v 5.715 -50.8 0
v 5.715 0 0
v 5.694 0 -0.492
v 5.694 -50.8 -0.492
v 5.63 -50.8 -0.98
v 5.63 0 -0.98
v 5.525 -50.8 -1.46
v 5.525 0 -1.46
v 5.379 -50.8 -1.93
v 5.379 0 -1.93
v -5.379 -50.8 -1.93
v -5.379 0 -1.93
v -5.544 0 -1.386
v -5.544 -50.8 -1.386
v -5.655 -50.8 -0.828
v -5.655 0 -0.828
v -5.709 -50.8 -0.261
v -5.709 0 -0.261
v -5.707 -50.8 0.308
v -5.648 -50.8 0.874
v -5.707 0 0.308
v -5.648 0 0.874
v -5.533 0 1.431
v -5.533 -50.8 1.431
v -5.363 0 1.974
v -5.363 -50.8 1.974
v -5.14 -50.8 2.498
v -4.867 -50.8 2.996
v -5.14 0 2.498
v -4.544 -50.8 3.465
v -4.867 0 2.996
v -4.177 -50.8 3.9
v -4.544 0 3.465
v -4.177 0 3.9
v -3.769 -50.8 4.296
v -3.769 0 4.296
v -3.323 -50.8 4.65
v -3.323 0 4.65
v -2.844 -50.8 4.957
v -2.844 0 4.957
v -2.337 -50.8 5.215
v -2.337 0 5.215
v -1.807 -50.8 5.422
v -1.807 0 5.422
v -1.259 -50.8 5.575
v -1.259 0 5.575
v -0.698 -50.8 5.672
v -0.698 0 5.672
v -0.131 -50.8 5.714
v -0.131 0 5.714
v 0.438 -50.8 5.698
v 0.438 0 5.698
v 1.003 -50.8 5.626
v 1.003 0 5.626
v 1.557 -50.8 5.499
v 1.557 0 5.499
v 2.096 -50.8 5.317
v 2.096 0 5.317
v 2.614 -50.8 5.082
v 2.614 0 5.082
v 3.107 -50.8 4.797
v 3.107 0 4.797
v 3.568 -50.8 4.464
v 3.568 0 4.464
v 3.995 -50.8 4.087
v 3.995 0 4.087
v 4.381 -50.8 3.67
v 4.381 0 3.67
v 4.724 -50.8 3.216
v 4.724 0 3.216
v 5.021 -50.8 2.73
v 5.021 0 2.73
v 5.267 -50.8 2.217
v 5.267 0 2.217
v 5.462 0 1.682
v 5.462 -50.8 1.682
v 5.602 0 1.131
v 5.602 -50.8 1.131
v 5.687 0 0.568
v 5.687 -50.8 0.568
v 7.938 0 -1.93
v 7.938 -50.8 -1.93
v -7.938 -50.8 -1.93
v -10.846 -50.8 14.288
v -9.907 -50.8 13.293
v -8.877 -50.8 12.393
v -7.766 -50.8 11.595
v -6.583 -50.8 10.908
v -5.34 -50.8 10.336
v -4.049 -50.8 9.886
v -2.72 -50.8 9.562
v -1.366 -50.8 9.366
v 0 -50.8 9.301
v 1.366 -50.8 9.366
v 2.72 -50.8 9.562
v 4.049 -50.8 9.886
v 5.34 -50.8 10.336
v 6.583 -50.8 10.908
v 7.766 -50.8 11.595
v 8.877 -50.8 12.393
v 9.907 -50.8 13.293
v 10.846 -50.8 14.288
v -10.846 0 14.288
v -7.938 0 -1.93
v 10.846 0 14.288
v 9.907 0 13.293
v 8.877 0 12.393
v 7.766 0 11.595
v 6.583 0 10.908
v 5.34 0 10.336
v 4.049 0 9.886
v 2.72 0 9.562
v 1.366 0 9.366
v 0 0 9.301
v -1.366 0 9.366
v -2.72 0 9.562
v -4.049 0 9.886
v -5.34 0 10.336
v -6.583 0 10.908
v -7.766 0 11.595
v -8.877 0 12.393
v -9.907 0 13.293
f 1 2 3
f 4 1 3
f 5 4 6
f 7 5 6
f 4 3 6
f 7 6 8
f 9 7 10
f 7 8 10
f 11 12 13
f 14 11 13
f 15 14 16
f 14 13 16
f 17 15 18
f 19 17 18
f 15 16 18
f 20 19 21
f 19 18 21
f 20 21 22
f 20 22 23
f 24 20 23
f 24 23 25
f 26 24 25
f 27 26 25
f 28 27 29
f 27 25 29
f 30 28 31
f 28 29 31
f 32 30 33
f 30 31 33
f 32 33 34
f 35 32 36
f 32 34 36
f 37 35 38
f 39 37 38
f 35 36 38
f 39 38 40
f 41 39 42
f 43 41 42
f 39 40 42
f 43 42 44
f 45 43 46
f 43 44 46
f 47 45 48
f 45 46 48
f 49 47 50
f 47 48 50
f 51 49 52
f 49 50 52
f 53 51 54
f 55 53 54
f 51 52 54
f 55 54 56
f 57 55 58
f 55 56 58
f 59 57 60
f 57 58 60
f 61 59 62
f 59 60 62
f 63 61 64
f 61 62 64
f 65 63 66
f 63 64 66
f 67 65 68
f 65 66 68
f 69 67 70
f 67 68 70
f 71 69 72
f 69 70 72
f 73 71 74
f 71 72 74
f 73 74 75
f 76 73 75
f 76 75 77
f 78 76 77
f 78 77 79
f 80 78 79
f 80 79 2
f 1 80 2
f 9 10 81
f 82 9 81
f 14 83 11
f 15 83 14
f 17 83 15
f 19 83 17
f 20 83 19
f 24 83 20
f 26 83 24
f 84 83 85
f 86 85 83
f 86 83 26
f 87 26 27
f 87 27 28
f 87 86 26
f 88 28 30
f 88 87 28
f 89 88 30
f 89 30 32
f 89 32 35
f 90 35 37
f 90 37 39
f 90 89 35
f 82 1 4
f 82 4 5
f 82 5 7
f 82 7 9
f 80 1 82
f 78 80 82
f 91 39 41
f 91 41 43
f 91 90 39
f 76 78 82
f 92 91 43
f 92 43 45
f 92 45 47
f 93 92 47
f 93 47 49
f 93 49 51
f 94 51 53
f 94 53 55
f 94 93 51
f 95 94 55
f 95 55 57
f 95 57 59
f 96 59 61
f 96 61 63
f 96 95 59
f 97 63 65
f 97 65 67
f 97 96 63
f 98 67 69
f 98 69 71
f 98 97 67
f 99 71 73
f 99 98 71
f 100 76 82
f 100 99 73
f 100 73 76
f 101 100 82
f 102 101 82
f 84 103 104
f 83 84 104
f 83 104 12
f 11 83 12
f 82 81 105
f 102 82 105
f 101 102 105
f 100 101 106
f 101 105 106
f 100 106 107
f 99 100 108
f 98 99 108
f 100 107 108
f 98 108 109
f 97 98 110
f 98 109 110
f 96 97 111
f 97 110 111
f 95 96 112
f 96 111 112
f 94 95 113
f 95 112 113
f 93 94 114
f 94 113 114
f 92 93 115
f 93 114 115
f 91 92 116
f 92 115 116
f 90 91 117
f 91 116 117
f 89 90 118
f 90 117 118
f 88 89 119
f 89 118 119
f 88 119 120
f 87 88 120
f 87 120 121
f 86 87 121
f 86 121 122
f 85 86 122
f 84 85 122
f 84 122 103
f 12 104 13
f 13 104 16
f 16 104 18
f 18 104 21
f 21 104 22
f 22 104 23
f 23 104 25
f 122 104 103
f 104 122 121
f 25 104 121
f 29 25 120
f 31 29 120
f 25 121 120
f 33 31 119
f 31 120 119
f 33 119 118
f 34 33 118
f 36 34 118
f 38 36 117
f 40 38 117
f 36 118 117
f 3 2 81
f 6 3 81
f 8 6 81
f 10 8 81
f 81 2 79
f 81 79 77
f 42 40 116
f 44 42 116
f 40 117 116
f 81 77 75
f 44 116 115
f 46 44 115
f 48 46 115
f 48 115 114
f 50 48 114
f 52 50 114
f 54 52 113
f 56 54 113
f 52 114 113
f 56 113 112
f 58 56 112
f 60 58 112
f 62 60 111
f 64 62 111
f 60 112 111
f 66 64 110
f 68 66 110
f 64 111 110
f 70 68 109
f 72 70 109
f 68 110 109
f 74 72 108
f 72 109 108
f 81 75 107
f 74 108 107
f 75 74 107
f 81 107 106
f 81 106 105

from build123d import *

# Parameters (mm, degrees)
F1_DEPTH = 50.8


# Not quite as in the source:
# - a feature names something its author has since deleted; it is built from what else it names


with BuildPart() as f1:
    # F0 (on Front) → F1 (new body)
    with BuildSketch(Plane.XZ):
        with BuildLine():
            Line((7.9375, -1.9304), (10.8458, 14.2875))
            ThreePointArc((10.8458, 14.2875), (0, 9.3006063571), (-10.8458, 14.2875))
            Line((-10.8458, 14.2875), (-7.9375, -1.9304))
            Line((-7.9375, -1.9304), (-5.3791059517, -1.9304))
            ThreePointArc((-5.3791059517, -1.9304), (-0.9797026298, 5.6304003194), (5.715, 0))
            ThreePointArc((5.715, 0), (5.6304003194, -0.9797026298), (5.3791059517, -1.9304))
            Line((5.3791059517, -1.9304), (7.9375, -1.9304))
        make_face()
    extrude(amount=F1_DEPTH)


solid = f1.part
